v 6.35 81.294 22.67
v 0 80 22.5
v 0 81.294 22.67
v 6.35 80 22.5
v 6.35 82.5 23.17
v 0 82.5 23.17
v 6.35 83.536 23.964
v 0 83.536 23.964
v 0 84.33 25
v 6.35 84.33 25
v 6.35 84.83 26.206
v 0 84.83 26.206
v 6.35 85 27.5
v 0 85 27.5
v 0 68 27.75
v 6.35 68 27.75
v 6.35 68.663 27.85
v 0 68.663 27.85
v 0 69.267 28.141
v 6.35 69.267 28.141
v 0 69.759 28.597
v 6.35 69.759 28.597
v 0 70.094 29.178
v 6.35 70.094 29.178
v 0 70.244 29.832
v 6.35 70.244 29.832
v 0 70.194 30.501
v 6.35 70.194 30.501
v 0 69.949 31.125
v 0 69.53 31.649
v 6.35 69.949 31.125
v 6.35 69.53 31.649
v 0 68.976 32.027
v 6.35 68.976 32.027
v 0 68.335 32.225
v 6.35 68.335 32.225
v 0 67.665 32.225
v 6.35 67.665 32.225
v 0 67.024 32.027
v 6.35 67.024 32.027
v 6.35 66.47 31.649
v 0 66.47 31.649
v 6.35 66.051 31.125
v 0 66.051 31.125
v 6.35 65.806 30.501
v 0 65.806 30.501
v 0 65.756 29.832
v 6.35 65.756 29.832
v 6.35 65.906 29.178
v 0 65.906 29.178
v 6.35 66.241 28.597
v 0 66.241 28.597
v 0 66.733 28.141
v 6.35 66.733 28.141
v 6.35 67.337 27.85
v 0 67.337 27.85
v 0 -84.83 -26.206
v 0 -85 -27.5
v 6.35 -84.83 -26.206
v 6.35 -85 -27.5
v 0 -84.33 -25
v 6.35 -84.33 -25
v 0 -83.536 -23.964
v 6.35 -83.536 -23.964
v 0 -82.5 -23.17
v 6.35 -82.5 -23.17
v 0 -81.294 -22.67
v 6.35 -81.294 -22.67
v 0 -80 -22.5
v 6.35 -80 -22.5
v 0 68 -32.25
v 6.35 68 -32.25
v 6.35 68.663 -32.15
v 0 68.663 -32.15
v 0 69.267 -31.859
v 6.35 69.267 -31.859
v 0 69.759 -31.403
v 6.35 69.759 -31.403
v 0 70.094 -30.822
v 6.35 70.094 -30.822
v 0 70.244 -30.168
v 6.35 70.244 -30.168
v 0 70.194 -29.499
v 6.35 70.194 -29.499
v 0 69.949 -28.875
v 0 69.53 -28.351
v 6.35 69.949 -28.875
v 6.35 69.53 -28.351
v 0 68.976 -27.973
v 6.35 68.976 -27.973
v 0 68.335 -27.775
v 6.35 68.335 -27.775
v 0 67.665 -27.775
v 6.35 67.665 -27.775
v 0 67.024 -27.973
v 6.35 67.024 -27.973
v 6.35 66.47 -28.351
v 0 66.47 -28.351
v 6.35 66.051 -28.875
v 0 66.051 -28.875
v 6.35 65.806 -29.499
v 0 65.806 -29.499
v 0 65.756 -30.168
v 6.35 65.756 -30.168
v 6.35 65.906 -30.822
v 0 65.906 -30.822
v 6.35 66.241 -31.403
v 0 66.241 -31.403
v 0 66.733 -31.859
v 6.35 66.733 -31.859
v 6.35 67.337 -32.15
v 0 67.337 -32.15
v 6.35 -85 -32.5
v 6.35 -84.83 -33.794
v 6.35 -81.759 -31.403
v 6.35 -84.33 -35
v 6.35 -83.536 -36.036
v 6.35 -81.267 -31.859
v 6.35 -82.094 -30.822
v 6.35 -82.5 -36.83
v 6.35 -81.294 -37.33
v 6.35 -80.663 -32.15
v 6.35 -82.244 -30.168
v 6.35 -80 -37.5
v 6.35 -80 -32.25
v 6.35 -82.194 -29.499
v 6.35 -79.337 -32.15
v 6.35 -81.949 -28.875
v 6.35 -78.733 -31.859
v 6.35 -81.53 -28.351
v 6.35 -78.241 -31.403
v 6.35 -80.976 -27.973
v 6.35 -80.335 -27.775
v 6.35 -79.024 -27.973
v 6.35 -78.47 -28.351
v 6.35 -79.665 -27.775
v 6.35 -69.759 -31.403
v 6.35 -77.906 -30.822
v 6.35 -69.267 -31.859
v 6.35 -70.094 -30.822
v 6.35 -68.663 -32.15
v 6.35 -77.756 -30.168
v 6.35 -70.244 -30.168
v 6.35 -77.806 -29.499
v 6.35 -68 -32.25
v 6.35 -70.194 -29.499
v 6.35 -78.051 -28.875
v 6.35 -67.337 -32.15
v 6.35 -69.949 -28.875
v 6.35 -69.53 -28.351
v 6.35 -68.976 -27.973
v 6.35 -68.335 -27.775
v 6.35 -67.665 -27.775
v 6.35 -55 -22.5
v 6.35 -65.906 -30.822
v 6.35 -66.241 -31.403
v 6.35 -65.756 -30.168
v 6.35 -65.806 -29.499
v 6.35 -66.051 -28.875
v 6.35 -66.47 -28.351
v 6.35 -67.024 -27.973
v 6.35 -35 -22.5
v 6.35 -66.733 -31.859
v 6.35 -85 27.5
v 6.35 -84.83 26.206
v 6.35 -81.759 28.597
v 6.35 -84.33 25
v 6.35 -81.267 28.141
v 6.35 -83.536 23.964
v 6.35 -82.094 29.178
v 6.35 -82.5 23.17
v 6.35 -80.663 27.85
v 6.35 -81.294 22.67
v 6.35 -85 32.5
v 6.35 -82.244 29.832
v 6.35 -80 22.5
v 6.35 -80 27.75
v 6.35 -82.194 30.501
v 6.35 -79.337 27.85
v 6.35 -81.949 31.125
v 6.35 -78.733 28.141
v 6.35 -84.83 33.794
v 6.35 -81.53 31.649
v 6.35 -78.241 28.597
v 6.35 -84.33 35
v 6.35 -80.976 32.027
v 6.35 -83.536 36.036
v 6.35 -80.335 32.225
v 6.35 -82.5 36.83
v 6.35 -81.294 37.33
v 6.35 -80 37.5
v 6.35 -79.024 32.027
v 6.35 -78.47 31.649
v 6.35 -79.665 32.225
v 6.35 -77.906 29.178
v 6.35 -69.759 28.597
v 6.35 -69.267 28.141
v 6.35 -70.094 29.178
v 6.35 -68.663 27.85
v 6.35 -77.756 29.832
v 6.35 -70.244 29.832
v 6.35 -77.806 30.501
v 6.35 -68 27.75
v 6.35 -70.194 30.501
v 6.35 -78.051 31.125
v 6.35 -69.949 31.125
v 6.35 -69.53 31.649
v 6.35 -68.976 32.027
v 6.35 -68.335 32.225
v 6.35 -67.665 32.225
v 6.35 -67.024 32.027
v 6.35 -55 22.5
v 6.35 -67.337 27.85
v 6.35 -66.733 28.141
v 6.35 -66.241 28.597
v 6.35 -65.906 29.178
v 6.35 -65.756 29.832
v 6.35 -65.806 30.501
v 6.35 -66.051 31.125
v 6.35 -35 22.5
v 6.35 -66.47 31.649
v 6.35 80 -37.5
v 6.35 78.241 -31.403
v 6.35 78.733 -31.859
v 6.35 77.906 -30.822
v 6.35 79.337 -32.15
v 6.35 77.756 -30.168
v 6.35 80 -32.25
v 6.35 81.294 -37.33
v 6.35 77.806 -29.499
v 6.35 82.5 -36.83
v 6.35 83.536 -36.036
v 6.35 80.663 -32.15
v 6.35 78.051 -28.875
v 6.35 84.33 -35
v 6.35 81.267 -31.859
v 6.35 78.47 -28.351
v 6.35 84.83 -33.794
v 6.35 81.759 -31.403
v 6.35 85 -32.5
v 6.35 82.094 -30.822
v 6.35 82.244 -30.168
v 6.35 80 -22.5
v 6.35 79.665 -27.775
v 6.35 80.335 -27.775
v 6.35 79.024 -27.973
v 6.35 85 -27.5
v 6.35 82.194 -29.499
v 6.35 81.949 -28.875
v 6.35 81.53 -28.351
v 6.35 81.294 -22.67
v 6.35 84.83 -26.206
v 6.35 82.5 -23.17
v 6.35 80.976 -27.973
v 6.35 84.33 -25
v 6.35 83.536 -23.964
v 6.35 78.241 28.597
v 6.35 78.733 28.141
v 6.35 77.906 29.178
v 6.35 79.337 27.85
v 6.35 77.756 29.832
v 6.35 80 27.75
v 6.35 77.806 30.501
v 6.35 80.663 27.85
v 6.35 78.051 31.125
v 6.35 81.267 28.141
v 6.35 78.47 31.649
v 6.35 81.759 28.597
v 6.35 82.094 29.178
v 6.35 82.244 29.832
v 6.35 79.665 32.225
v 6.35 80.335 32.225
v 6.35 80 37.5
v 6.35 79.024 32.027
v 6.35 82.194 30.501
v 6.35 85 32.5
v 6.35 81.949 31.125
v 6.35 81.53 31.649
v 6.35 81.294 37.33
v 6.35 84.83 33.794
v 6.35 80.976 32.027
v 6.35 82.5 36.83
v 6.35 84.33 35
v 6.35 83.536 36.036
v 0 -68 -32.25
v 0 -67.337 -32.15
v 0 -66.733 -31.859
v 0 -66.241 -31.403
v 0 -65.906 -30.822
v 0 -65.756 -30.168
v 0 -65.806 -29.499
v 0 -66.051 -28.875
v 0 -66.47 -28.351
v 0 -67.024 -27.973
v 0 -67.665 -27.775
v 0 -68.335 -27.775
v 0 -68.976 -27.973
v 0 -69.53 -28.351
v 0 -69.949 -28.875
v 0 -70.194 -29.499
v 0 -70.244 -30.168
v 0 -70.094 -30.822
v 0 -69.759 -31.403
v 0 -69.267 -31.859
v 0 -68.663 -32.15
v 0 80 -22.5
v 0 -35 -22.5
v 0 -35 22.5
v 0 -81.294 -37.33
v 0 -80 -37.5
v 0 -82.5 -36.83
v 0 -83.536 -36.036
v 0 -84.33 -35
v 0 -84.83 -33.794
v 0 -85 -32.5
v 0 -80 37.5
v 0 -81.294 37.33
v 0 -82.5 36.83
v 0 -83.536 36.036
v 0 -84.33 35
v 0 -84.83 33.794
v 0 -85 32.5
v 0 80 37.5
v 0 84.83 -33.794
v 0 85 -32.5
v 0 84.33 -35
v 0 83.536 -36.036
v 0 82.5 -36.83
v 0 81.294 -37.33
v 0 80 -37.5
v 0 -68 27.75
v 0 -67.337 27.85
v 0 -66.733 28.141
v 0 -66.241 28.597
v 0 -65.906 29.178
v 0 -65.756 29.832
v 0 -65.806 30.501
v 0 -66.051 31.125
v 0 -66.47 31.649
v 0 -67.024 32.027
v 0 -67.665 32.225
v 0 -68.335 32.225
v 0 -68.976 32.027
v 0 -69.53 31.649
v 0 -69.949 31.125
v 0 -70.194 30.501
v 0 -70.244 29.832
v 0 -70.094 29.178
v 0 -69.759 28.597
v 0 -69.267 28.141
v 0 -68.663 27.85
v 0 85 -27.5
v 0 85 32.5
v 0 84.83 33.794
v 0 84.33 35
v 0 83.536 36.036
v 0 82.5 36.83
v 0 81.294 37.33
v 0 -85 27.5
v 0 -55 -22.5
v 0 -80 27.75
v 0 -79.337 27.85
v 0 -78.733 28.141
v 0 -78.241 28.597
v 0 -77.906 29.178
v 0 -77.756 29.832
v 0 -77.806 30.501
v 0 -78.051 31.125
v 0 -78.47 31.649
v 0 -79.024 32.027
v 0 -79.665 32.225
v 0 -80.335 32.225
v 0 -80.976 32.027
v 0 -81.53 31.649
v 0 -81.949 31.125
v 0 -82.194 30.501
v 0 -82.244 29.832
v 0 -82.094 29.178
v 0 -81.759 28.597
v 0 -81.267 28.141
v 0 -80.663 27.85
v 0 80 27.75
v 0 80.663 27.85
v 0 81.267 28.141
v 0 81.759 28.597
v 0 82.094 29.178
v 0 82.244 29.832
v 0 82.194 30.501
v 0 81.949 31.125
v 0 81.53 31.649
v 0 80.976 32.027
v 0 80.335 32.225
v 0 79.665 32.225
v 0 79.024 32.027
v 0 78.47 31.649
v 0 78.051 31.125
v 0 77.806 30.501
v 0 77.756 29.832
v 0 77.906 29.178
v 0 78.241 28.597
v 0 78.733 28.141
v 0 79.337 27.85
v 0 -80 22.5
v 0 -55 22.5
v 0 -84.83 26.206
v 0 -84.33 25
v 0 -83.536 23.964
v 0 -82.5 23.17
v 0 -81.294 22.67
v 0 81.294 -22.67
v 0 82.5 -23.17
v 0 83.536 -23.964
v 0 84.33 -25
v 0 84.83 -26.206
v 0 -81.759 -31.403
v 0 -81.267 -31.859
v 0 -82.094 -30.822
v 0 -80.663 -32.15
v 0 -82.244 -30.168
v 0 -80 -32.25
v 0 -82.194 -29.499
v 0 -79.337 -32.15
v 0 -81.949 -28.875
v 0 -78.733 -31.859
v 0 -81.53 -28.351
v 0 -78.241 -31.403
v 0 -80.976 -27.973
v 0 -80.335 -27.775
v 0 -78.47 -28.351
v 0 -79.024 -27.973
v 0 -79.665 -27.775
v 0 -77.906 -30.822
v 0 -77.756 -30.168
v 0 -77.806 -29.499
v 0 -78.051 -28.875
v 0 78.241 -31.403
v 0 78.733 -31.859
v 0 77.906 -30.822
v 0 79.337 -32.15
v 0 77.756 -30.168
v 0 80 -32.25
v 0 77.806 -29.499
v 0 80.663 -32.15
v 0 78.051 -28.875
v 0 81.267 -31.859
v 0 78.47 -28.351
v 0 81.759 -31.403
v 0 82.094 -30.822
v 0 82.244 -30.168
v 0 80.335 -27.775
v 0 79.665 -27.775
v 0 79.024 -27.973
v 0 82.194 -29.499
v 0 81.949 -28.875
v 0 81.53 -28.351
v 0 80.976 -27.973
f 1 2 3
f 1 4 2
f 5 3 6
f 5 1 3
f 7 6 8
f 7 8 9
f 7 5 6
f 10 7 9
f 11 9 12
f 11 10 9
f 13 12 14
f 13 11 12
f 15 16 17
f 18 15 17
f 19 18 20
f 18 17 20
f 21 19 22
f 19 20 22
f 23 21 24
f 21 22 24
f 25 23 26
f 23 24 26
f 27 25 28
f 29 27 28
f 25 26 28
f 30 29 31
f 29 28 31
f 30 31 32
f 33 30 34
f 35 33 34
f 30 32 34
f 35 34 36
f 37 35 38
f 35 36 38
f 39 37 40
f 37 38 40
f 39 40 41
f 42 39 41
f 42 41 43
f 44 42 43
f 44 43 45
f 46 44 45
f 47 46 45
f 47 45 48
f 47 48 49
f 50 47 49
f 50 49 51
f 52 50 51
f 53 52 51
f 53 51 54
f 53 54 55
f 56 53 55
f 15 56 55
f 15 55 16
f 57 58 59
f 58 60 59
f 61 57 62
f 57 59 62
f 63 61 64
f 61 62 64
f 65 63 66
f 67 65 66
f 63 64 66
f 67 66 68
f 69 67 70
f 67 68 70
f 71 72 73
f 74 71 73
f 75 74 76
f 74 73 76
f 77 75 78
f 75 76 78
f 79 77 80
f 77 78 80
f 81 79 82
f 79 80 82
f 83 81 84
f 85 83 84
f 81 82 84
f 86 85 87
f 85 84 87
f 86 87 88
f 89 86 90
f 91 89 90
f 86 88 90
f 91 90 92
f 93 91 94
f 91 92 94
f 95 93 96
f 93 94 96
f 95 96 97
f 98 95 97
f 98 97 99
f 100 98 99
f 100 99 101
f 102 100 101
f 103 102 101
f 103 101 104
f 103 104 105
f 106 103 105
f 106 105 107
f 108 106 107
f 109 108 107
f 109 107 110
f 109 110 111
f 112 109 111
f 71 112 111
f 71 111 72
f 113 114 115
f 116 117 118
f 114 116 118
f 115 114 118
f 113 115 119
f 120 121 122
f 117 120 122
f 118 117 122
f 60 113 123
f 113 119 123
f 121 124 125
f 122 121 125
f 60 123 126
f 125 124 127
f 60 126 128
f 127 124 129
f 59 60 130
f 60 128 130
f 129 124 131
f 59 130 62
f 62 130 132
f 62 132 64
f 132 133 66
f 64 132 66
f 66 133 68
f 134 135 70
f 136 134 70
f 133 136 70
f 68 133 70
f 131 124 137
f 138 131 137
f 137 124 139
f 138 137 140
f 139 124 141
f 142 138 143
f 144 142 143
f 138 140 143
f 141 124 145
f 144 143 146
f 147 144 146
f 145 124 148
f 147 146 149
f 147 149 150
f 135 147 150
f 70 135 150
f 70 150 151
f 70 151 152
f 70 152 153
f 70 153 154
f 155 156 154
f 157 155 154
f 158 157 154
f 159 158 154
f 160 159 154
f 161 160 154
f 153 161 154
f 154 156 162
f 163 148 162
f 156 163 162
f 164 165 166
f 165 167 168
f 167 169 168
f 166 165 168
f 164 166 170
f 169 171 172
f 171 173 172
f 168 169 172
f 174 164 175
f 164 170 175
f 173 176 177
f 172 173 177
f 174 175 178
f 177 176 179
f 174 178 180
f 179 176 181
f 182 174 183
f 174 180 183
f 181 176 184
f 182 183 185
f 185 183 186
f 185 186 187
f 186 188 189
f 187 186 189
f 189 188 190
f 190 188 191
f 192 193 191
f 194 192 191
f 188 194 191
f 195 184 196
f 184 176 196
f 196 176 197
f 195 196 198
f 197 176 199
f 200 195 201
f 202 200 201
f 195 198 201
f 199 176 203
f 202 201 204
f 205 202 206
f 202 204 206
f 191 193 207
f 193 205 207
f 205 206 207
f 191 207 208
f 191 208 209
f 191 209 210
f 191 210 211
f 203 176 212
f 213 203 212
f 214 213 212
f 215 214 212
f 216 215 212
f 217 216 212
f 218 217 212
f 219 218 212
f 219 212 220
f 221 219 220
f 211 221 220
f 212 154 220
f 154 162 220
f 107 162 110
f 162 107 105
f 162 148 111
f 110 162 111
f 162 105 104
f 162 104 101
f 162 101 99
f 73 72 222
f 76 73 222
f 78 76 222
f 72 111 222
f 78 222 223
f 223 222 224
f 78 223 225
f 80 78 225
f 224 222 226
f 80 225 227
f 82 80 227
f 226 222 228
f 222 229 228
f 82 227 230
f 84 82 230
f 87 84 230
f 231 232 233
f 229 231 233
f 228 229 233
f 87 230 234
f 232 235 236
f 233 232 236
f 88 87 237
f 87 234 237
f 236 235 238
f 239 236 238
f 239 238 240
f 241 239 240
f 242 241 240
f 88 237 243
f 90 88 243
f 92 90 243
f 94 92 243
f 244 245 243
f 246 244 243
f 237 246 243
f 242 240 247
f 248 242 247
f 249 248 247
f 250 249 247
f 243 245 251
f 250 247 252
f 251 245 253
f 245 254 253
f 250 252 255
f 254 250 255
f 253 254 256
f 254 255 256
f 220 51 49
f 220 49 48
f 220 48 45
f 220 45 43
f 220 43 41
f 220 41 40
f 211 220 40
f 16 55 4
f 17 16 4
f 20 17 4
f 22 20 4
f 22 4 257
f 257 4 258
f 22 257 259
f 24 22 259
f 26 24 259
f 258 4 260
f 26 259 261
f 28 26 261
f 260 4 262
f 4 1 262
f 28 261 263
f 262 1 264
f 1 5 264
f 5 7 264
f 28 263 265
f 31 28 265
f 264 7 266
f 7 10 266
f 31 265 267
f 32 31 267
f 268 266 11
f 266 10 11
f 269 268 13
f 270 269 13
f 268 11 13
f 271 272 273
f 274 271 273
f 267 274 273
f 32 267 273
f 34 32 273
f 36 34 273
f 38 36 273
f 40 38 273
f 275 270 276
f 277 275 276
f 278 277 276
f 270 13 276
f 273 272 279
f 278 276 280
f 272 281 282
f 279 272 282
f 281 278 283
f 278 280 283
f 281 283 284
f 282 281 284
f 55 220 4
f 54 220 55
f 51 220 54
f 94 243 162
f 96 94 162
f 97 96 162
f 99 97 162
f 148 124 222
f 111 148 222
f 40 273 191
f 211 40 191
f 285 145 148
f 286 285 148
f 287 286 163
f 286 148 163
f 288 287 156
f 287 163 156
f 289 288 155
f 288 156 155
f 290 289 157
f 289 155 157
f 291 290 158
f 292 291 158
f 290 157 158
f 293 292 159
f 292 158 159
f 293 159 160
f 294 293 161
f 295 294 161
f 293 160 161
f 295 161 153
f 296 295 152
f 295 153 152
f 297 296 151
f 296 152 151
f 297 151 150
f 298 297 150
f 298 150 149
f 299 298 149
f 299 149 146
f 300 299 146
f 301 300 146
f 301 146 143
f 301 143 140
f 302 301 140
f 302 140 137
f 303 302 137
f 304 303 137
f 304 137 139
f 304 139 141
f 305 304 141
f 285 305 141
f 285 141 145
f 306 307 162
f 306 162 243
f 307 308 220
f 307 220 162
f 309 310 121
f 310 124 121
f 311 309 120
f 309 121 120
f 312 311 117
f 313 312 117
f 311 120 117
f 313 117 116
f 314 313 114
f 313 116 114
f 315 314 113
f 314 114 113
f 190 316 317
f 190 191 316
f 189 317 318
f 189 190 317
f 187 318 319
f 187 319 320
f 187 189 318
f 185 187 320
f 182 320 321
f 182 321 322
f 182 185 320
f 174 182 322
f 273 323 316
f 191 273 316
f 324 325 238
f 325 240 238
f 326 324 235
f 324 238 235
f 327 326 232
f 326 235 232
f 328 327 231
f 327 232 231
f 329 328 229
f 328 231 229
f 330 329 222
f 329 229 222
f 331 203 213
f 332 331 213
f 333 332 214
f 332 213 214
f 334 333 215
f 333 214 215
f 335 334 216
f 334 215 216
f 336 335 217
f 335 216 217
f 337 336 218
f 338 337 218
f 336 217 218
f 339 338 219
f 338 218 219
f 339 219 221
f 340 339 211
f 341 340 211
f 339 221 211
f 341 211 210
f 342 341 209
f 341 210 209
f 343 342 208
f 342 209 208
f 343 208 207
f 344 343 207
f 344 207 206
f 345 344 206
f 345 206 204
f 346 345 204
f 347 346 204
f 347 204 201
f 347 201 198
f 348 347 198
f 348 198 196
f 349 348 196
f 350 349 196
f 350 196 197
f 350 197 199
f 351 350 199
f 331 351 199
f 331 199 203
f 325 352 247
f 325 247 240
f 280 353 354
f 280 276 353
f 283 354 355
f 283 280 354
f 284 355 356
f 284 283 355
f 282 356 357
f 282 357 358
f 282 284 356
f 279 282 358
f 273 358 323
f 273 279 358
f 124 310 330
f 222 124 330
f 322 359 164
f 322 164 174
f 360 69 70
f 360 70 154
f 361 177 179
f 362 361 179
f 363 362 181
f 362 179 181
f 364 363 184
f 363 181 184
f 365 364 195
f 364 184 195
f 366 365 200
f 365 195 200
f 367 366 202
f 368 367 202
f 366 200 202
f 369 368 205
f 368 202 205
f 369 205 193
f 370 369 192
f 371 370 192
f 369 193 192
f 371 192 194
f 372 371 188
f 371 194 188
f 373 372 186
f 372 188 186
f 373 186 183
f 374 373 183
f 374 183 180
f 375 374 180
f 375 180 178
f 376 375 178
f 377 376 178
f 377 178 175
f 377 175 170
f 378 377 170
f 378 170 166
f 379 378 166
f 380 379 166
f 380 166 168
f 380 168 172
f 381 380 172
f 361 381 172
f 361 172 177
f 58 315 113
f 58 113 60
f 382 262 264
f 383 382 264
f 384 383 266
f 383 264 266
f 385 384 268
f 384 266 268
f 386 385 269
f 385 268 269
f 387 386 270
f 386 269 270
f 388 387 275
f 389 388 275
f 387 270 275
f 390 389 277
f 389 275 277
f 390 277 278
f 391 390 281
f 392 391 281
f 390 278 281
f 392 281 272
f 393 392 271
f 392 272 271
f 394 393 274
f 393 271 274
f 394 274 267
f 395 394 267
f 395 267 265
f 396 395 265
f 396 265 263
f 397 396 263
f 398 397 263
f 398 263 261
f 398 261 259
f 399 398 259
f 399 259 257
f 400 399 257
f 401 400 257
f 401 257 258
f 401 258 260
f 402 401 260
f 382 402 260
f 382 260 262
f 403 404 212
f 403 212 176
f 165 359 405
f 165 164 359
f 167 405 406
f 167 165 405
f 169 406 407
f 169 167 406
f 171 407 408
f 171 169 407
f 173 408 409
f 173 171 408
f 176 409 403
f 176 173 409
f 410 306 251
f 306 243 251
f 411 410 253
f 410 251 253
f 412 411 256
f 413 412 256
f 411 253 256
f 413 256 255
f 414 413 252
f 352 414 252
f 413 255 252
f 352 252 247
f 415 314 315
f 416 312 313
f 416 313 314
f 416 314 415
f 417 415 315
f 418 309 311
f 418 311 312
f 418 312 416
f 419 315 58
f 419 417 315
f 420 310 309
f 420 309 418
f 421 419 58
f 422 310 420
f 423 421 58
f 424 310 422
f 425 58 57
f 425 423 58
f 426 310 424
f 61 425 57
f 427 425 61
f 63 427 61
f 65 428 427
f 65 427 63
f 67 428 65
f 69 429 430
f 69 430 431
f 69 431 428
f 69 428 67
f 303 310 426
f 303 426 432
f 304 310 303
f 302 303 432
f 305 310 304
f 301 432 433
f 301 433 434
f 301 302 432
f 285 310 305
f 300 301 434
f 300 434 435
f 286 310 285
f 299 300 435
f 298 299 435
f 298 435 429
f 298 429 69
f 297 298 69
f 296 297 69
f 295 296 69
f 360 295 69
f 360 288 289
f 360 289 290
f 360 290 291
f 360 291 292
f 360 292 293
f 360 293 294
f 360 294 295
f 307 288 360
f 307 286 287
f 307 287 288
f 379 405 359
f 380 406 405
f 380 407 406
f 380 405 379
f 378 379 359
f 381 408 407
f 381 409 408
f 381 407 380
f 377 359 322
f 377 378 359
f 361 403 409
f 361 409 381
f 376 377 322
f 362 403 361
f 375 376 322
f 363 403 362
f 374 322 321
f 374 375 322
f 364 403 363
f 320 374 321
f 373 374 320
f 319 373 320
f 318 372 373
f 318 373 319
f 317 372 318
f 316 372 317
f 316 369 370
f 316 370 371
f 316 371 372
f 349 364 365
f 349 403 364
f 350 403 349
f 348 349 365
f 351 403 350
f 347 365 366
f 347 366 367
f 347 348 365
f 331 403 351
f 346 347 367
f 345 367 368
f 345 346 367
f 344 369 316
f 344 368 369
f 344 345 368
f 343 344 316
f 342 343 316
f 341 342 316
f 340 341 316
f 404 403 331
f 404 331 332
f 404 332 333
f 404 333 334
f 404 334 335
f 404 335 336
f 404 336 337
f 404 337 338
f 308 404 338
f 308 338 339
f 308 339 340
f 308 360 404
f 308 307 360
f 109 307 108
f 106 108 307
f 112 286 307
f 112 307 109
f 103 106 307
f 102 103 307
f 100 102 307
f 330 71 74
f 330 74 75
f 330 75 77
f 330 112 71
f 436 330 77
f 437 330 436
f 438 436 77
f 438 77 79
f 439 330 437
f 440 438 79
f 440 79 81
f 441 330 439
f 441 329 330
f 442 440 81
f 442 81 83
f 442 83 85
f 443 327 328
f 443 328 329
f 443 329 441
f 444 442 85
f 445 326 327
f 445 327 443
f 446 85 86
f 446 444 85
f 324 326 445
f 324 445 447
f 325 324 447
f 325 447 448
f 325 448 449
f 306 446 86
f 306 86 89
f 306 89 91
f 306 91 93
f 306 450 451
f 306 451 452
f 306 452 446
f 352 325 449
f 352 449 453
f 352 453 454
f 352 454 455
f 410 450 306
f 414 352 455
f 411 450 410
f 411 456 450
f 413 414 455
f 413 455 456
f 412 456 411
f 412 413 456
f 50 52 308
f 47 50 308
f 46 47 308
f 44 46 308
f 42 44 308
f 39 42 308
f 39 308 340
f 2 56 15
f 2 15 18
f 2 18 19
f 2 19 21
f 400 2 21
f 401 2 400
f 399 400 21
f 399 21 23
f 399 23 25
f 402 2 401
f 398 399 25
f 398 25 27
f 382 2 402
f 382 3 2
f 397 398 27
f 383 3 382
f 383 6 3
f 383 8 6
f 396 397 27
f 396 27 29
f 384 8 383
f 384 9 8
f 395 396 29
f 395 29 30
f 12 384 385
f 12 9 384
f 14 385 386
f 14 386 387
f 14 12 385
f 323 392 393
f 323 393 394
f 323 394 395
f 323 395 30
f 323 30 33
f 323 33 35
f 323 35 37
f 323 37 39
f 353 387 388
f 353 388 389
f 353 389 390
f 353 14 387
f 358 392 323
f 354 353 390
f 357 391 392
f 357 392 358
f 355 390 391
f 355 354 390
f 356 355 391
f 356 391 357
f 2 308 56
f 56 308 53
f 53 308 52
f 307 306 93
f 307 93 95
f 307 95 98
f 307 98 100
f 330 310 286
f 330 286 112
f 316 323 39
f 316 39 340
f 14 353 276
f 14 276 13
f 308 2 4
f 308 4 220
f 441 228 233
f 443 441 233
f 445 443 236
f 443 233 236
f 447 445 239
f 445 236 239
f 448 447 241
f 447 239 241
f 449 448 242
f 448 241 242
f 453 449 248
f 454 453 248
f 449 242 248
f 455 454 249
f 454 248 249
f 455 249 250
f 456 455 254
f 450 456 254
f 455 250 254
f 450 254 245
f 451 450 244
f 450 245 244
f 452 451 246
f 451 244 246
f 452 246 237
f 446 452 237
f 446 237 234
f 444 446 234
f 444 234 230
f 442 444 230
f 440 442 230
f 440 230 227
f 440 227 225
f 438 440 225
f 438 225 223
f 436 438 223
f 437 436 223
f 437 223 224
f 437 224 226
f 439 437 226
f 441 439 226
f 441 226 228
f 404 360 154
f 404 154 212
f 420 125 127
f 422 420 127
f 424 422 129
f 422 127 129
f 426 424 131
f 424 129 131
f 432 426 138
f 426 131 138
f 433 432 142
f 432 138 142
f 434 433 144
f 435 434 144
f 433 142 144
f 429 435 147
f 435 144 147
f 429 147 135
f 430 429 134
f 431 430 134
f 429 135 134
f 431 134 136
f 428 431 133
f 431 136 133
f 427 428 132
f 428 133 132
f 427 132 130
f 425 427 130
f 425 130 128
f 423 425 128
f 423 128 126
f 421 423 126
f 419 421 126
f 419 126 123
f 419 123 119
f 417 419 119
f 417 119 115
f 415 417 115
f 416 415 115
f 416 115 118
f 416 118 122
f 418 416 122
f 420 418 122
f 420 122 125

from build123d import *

# Parameters (mm, degrees)
SALIENTE_EXTRUIR1_DEPTH      = 6.35
TALADRO_DE_MARGEN_PARA_M41_D = 4.5
REDONDEO1_R                  = 5


with BuildPart() as part:
    # Croquis1 → Saliente-Extruir1 (new body)
    with BuildSketch(Plane(origin=(0, 0, 0), x_dir=(0, 0, -1), z_dir=(1, 0, 0))):
        Polygon((-22.5, 85), (-22.5, -35), (22.5, -35), (22.5, 85), (37.5, 85), (37.5, 35), (37.5, -35), (37.5, -85), (22.5, -85), (22.5, -55), (-22.5, -55), (-22.5, -85), (-37.5, -85), (-37.5, -35), (-37.5, 35), (-37.5, 85), align=None)
    extrude(amount=SALIENTE_EXTRUIR1_DEPTH)

    # Taladro de margen para M41 (through all)
    with Locations(Plane.ZY):
        with Locations((30, 68), (30, 80), (-30, 68), (-30, 80), (30, -80), (30, -68), (-30, -80), (-30, -68)):
            Hole(TALADRO_DE_MARGEN_PARA_M41_D / 2)

    # Redondeo1
    redondeo1_edges = [part.edges().sort_by_distance(p)[0] for p in [
        (3.175, 85, 22.5),
        (3.175, 85, -22.5),
        (3.175, 85, -37.5),
        (3.175, -85, -37.5),
        (3.175, -85, -22.5),
        (3.175, -85, 22.5),
        (3.175, -85, 37.5),
        (3.175, 85, 37.5),
    ]]
    fillet(redondeo1_edges, radius=REDONDEO1_R)


solid = part.part
